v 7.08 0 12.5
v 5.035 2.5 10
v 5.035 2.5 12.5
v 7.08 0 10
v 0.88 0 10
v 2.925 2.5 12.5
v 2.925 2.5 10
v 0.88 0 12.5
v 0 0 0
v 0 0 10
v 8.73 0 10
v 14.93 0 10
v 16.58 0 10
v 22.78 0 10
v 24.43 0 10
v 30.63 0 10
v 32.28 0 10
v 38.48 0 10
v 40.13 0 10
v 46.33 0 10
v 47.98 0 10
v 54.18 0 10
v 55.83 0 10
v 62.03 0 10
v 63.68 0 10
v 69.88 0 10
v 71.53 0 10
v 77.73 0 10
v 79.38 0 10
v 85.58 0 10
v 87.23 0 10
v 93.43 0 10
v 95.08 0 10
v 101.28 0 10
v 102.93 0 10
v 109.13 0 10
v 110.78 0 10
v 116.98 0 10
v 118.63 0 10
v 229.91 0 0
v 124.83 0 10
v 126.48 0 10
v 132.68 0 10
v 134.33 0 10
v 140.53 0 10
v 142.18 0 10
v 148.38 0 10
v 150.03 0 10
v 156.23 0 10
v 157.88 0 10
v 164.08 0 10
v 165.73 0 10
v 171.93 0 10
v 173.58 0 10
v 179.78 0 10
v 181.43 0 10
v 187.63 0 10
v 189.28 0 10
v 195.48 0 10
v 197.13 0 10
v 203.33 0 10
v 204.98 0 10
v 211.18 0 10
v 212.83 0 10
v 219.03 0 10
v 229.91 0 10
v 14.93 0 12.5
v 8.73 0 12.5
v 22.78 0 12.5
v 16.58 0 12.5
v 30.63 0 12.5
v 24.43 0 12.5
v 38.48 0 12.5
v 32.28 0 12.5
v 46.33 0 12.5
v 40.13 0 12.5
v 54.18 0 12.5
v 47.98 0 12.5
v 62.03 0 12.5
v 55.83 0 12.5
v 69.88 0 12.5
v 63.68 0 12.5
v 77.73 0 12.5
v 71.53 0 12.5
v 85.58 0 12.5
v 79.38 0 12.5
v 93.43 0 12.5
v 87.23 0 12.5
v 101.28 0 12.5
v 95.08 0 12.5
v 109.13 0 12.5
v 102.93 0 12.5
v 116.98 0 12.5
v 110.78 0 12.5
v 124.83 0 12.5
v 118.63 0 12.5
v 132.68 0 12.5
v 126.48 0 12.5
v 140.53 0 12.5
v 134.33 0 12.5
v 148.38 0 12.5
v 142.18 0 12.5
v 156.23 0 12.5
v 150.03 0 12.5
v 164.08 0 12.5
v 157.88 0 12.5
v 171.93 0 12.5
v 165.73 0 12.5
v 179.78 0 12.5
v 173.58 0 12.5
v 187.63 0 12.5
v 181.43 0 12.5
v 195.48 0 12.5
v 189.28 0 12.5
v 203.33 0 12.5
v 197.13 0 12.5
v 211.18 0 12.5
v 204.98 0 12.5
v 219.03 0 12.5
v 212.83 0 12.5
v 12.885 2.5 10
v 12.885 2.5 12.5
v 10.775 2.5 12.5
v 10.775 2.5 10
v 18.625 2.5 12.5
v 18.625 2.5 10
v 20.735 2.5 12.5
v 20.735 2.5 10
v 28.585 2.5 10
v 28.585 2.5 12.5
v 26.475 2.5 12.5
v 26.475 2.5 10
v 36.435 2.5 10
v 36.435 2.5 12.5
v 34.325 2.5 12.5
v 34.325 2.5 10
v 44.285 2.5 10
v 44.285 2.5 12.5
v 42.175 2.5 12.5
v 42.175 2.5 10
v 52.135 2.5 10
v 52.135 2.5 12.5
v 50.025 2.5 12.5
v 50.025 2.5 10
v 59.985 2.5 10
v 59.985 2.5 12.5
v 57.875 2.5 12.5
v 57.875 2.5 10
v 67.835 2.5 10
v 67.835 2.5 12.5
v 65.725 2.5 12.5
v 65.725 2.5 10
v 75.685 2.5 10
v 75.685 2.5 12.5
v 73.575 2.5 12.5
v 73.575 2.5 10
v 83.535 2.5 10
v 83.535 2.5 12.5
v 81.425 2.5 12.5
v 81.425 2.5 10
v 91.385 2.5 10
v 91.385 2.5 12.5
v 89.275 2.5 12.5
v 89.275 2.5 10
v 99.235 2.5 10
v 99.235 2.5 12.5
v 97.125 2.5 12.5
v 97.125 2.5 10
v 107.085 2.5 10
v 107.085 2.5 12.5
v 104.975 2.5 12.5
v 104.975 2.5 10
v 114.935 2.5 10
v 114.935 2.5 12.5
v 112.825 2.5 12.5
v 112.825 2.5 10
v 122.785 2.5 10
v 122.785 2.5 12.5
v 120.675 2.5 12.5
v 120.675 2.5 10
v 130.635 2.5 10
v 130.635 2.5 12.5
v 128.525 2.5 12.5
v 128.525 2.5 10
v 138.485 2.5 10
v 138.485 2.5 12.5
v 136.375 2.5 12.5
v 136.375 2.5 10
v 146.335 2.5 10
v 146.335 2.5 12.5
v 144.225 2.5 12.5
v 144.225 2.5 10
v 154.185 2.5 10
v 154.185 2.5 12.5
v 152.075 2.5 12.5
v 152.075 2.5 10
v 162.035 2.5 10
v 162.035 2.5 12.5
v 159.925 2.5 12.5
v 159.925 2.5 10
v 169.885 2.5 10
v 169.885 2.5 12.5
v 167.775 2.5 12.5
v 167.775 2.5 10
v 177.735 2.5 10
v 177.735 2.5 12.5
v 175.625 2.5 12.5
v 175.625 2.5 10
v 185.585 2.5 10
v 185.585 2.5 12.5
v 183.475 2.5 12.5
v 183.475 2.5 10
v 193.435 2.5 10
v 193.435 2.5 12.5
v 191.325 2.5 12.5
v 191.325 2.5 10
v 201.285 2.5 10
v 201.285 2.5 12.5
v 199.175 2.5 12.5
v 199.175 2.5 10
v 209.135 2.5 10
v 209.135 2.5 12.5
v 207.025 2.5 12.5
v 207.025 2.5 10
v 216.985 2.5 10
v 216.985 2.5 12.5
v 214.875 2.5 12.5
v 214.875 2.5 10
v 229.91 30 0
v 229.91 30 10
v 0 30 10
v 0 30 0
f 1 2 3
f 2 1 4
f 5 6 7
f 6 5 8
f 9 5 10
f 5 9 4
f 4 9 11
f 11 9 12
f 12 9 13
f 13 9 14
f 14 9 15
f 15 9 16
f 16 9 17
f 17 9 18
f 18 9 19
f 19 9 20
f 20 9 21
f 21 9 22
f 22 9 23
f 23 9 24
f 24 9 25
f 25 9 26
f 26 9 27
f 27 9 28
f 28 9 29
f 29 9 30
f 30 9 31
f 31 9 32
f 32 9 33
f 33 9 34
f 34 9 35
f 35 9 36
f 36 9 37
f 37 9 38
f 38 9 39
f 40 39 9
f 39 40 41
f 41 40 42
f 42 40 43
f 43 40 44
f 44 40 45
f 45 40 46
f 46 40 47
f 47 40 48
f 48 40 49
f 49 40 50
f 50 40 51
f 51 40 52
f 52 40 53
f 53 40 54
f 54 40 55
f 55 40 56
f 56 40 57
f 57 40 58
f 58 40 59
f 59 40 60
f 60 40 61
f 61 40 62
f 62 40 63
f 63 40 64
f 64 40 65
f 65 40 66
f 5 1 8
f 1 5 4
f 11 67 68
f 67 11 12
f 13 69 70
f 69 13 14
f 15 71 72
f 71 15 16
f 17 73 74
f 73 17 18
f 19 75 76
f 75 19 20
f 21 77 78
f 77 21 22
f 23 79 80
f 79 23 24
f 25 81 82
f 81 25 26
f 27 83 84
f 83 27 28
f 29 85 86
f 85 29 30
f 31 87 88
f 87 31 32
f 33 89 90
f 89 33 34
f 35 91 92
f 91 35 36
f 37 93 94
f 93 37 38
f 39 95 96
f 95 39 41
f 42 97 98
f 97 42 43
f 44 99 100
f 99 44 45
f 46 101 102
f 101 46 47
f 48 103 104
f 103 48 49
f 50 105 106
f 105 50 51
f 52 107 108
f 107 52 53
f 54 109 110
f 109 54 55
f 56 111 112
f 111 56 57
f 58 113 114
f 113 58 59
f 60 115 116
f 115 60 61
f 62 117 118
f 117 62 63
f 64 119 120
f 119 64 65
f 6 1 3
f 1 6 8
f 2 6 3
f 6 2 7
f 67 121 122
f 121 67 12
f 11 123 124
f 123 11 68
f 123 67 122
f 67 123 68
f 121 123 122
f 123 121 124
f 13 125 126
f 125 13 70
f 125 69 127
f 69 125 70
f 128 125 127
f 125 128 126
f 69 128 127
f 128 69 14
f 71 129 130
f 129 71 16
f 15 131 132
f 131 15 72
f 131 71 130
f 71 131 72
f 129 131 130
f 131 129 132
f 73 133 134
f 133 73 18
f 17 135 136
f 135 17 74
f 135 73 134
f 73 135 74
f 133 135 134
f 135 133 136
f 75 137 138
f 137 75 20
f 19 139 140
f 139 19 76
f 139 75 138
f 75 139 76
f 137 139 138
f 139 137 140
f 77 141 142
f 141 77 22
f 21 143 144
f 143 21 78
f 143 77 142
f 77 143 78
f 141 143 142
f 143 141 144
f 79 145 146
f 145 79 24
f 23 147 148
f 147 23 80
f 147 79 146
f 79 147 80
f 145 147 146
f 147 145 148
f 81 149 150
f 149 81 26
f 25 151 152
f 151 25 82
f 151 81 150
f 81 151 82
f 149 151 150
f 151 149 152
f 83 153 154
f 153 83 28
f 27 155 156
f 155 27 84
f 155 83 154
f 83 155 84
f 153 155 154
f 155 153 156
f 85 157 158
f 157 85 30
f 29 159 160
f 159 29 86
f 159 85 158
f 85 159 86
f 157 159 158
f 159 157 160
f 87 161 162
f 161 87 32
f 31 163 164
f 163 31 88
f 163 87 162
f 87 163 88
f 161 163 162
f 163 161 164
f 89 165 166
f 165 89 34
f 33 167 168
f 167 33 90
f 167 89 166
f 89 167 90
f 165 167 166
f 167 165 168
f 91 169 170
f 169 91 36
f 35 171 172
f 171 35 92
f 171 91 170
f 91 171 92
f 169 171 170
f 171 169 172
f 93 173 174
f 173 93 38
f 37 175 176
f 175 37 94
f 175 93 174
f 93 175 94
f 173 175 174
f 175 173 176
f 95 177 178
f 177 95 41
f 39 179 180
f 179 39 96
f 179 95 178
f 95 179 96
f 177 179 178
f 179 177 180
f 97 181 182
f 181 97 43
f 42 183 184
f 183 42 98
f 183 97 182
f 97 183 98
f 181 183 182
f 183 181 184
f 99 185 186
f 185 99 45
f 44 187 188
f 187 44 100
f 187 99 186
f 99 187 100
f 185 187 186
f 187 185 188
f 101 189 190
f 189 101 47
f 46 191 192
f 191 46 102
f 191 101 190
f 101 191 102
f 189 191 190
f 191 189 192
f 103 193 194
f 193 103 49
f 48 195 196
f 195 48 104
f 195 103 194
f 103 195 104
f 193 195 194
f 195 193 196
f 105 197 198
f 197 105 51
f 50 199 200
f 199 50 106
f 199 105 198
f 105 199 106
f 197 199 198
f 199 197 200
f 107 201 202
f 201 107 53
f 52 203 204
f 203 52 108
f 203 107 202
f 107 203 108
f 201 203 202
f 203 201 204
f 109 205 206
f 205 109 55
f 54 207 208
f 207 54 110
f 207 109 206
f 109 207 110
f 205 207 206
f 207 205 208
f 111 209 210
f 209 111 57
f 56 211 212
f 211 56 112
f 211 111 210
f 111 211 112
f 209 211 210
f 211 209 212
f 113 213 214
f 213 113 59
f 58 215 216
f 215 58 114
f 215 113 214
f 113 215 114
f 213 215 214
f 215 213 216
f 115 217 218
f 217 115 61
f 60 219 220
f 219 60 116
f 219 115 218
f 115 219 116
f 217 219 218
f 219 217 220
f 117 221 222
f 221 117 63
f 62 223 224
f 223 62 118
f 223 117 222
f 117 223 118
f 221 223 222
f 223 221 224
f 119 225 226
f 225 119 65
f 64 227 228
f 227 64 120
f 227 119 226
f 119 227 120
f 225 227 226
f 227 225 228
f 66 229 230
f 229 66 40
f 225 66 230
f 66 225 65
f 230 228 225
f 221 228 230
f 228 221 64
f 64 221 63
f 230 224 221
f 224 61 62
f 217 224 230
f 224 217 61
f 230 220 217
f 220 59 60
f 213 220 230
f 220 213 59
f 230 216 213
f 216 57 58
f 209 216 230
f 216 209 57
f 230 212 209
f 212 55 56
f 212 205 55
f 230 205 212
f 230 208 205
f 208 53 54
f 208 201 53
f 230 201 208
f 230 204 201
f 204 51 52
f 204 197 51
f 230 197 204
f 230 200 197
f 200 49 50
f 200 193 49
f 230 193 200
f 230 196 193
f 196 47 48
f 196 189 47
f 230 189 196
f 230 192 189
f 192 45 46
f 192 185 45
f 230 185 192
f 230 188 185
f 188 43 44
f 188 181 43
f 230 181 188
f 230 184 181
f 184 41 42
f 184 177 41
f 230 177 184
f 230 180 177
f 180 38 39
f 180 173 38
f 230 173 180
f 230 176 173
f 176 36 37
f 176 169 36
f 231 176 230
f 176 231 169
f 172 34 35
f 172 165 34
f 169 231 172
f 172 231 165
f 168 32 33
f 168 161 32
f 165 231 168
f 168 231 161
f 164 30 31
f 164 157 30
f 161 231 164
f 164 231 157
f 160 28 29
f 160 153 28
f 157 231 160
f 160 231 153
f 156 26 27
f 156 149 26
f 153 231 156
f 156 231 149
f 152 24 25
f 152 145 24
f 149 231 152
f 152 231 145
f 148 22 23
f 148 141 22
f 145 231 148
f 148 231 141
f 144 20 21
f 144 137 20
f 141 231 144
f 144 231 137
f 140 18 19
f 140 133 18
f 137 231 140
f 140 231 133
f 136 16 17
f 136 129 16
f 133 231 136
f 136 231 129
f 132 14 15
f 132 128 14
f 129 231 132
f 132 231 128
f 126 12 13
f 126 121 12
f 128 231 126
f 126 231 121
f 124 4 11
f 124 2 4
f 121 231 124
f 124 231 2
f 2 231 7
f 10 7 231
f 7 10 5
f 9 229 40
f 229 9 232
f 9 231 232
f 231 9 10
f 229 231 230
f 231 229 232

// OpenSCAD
$fn = 32;

// ----------------------------------------------------------------------
// Gear rack: m=2.5 z=28, 229.91 x 30 x 12.5 mm
// ----------------------------------------------------------------------

// --- parameters (mm) ---
rack_len = 229.91;        // rack length, X
rack_w = 30;              // rack width, Y
rack_h = 12.5;            // overall height, Z
modul = 2.5;              // module
body_t = 10;              // tooth root line height
pitch = 7.85;             // circular pitch
tip_w = 2.11;             // tooth thickness at the tip
root_w = 6.2;             // tooth thickness at the root line
sink = 0.6;               // tooth root overlap into the body

tooth_span = 219.91;

module tooth(x0) {
  /* 20 deg flank profile, sunk into the body for a positive overlap */
  translate([x0, 0, body_t - sink])
    linear_extrude(height = rack_h - body_t + sink)
      polygon(points = [[-root_w / 2, 0], [root_w / 2, 0],
                        [tip_w / 2, rack_h - body_t],
                        [-tip_w / 2, rack_h - body_t]]);
}

difference() {
  union() {
    cube([rack_len, rack_w, body_t]);
    for (i = [0 : 28 - 1])
      tooth((i + 0.5) * pitch + (tooth_span - 28 * pitch) / 2);
  }
}
